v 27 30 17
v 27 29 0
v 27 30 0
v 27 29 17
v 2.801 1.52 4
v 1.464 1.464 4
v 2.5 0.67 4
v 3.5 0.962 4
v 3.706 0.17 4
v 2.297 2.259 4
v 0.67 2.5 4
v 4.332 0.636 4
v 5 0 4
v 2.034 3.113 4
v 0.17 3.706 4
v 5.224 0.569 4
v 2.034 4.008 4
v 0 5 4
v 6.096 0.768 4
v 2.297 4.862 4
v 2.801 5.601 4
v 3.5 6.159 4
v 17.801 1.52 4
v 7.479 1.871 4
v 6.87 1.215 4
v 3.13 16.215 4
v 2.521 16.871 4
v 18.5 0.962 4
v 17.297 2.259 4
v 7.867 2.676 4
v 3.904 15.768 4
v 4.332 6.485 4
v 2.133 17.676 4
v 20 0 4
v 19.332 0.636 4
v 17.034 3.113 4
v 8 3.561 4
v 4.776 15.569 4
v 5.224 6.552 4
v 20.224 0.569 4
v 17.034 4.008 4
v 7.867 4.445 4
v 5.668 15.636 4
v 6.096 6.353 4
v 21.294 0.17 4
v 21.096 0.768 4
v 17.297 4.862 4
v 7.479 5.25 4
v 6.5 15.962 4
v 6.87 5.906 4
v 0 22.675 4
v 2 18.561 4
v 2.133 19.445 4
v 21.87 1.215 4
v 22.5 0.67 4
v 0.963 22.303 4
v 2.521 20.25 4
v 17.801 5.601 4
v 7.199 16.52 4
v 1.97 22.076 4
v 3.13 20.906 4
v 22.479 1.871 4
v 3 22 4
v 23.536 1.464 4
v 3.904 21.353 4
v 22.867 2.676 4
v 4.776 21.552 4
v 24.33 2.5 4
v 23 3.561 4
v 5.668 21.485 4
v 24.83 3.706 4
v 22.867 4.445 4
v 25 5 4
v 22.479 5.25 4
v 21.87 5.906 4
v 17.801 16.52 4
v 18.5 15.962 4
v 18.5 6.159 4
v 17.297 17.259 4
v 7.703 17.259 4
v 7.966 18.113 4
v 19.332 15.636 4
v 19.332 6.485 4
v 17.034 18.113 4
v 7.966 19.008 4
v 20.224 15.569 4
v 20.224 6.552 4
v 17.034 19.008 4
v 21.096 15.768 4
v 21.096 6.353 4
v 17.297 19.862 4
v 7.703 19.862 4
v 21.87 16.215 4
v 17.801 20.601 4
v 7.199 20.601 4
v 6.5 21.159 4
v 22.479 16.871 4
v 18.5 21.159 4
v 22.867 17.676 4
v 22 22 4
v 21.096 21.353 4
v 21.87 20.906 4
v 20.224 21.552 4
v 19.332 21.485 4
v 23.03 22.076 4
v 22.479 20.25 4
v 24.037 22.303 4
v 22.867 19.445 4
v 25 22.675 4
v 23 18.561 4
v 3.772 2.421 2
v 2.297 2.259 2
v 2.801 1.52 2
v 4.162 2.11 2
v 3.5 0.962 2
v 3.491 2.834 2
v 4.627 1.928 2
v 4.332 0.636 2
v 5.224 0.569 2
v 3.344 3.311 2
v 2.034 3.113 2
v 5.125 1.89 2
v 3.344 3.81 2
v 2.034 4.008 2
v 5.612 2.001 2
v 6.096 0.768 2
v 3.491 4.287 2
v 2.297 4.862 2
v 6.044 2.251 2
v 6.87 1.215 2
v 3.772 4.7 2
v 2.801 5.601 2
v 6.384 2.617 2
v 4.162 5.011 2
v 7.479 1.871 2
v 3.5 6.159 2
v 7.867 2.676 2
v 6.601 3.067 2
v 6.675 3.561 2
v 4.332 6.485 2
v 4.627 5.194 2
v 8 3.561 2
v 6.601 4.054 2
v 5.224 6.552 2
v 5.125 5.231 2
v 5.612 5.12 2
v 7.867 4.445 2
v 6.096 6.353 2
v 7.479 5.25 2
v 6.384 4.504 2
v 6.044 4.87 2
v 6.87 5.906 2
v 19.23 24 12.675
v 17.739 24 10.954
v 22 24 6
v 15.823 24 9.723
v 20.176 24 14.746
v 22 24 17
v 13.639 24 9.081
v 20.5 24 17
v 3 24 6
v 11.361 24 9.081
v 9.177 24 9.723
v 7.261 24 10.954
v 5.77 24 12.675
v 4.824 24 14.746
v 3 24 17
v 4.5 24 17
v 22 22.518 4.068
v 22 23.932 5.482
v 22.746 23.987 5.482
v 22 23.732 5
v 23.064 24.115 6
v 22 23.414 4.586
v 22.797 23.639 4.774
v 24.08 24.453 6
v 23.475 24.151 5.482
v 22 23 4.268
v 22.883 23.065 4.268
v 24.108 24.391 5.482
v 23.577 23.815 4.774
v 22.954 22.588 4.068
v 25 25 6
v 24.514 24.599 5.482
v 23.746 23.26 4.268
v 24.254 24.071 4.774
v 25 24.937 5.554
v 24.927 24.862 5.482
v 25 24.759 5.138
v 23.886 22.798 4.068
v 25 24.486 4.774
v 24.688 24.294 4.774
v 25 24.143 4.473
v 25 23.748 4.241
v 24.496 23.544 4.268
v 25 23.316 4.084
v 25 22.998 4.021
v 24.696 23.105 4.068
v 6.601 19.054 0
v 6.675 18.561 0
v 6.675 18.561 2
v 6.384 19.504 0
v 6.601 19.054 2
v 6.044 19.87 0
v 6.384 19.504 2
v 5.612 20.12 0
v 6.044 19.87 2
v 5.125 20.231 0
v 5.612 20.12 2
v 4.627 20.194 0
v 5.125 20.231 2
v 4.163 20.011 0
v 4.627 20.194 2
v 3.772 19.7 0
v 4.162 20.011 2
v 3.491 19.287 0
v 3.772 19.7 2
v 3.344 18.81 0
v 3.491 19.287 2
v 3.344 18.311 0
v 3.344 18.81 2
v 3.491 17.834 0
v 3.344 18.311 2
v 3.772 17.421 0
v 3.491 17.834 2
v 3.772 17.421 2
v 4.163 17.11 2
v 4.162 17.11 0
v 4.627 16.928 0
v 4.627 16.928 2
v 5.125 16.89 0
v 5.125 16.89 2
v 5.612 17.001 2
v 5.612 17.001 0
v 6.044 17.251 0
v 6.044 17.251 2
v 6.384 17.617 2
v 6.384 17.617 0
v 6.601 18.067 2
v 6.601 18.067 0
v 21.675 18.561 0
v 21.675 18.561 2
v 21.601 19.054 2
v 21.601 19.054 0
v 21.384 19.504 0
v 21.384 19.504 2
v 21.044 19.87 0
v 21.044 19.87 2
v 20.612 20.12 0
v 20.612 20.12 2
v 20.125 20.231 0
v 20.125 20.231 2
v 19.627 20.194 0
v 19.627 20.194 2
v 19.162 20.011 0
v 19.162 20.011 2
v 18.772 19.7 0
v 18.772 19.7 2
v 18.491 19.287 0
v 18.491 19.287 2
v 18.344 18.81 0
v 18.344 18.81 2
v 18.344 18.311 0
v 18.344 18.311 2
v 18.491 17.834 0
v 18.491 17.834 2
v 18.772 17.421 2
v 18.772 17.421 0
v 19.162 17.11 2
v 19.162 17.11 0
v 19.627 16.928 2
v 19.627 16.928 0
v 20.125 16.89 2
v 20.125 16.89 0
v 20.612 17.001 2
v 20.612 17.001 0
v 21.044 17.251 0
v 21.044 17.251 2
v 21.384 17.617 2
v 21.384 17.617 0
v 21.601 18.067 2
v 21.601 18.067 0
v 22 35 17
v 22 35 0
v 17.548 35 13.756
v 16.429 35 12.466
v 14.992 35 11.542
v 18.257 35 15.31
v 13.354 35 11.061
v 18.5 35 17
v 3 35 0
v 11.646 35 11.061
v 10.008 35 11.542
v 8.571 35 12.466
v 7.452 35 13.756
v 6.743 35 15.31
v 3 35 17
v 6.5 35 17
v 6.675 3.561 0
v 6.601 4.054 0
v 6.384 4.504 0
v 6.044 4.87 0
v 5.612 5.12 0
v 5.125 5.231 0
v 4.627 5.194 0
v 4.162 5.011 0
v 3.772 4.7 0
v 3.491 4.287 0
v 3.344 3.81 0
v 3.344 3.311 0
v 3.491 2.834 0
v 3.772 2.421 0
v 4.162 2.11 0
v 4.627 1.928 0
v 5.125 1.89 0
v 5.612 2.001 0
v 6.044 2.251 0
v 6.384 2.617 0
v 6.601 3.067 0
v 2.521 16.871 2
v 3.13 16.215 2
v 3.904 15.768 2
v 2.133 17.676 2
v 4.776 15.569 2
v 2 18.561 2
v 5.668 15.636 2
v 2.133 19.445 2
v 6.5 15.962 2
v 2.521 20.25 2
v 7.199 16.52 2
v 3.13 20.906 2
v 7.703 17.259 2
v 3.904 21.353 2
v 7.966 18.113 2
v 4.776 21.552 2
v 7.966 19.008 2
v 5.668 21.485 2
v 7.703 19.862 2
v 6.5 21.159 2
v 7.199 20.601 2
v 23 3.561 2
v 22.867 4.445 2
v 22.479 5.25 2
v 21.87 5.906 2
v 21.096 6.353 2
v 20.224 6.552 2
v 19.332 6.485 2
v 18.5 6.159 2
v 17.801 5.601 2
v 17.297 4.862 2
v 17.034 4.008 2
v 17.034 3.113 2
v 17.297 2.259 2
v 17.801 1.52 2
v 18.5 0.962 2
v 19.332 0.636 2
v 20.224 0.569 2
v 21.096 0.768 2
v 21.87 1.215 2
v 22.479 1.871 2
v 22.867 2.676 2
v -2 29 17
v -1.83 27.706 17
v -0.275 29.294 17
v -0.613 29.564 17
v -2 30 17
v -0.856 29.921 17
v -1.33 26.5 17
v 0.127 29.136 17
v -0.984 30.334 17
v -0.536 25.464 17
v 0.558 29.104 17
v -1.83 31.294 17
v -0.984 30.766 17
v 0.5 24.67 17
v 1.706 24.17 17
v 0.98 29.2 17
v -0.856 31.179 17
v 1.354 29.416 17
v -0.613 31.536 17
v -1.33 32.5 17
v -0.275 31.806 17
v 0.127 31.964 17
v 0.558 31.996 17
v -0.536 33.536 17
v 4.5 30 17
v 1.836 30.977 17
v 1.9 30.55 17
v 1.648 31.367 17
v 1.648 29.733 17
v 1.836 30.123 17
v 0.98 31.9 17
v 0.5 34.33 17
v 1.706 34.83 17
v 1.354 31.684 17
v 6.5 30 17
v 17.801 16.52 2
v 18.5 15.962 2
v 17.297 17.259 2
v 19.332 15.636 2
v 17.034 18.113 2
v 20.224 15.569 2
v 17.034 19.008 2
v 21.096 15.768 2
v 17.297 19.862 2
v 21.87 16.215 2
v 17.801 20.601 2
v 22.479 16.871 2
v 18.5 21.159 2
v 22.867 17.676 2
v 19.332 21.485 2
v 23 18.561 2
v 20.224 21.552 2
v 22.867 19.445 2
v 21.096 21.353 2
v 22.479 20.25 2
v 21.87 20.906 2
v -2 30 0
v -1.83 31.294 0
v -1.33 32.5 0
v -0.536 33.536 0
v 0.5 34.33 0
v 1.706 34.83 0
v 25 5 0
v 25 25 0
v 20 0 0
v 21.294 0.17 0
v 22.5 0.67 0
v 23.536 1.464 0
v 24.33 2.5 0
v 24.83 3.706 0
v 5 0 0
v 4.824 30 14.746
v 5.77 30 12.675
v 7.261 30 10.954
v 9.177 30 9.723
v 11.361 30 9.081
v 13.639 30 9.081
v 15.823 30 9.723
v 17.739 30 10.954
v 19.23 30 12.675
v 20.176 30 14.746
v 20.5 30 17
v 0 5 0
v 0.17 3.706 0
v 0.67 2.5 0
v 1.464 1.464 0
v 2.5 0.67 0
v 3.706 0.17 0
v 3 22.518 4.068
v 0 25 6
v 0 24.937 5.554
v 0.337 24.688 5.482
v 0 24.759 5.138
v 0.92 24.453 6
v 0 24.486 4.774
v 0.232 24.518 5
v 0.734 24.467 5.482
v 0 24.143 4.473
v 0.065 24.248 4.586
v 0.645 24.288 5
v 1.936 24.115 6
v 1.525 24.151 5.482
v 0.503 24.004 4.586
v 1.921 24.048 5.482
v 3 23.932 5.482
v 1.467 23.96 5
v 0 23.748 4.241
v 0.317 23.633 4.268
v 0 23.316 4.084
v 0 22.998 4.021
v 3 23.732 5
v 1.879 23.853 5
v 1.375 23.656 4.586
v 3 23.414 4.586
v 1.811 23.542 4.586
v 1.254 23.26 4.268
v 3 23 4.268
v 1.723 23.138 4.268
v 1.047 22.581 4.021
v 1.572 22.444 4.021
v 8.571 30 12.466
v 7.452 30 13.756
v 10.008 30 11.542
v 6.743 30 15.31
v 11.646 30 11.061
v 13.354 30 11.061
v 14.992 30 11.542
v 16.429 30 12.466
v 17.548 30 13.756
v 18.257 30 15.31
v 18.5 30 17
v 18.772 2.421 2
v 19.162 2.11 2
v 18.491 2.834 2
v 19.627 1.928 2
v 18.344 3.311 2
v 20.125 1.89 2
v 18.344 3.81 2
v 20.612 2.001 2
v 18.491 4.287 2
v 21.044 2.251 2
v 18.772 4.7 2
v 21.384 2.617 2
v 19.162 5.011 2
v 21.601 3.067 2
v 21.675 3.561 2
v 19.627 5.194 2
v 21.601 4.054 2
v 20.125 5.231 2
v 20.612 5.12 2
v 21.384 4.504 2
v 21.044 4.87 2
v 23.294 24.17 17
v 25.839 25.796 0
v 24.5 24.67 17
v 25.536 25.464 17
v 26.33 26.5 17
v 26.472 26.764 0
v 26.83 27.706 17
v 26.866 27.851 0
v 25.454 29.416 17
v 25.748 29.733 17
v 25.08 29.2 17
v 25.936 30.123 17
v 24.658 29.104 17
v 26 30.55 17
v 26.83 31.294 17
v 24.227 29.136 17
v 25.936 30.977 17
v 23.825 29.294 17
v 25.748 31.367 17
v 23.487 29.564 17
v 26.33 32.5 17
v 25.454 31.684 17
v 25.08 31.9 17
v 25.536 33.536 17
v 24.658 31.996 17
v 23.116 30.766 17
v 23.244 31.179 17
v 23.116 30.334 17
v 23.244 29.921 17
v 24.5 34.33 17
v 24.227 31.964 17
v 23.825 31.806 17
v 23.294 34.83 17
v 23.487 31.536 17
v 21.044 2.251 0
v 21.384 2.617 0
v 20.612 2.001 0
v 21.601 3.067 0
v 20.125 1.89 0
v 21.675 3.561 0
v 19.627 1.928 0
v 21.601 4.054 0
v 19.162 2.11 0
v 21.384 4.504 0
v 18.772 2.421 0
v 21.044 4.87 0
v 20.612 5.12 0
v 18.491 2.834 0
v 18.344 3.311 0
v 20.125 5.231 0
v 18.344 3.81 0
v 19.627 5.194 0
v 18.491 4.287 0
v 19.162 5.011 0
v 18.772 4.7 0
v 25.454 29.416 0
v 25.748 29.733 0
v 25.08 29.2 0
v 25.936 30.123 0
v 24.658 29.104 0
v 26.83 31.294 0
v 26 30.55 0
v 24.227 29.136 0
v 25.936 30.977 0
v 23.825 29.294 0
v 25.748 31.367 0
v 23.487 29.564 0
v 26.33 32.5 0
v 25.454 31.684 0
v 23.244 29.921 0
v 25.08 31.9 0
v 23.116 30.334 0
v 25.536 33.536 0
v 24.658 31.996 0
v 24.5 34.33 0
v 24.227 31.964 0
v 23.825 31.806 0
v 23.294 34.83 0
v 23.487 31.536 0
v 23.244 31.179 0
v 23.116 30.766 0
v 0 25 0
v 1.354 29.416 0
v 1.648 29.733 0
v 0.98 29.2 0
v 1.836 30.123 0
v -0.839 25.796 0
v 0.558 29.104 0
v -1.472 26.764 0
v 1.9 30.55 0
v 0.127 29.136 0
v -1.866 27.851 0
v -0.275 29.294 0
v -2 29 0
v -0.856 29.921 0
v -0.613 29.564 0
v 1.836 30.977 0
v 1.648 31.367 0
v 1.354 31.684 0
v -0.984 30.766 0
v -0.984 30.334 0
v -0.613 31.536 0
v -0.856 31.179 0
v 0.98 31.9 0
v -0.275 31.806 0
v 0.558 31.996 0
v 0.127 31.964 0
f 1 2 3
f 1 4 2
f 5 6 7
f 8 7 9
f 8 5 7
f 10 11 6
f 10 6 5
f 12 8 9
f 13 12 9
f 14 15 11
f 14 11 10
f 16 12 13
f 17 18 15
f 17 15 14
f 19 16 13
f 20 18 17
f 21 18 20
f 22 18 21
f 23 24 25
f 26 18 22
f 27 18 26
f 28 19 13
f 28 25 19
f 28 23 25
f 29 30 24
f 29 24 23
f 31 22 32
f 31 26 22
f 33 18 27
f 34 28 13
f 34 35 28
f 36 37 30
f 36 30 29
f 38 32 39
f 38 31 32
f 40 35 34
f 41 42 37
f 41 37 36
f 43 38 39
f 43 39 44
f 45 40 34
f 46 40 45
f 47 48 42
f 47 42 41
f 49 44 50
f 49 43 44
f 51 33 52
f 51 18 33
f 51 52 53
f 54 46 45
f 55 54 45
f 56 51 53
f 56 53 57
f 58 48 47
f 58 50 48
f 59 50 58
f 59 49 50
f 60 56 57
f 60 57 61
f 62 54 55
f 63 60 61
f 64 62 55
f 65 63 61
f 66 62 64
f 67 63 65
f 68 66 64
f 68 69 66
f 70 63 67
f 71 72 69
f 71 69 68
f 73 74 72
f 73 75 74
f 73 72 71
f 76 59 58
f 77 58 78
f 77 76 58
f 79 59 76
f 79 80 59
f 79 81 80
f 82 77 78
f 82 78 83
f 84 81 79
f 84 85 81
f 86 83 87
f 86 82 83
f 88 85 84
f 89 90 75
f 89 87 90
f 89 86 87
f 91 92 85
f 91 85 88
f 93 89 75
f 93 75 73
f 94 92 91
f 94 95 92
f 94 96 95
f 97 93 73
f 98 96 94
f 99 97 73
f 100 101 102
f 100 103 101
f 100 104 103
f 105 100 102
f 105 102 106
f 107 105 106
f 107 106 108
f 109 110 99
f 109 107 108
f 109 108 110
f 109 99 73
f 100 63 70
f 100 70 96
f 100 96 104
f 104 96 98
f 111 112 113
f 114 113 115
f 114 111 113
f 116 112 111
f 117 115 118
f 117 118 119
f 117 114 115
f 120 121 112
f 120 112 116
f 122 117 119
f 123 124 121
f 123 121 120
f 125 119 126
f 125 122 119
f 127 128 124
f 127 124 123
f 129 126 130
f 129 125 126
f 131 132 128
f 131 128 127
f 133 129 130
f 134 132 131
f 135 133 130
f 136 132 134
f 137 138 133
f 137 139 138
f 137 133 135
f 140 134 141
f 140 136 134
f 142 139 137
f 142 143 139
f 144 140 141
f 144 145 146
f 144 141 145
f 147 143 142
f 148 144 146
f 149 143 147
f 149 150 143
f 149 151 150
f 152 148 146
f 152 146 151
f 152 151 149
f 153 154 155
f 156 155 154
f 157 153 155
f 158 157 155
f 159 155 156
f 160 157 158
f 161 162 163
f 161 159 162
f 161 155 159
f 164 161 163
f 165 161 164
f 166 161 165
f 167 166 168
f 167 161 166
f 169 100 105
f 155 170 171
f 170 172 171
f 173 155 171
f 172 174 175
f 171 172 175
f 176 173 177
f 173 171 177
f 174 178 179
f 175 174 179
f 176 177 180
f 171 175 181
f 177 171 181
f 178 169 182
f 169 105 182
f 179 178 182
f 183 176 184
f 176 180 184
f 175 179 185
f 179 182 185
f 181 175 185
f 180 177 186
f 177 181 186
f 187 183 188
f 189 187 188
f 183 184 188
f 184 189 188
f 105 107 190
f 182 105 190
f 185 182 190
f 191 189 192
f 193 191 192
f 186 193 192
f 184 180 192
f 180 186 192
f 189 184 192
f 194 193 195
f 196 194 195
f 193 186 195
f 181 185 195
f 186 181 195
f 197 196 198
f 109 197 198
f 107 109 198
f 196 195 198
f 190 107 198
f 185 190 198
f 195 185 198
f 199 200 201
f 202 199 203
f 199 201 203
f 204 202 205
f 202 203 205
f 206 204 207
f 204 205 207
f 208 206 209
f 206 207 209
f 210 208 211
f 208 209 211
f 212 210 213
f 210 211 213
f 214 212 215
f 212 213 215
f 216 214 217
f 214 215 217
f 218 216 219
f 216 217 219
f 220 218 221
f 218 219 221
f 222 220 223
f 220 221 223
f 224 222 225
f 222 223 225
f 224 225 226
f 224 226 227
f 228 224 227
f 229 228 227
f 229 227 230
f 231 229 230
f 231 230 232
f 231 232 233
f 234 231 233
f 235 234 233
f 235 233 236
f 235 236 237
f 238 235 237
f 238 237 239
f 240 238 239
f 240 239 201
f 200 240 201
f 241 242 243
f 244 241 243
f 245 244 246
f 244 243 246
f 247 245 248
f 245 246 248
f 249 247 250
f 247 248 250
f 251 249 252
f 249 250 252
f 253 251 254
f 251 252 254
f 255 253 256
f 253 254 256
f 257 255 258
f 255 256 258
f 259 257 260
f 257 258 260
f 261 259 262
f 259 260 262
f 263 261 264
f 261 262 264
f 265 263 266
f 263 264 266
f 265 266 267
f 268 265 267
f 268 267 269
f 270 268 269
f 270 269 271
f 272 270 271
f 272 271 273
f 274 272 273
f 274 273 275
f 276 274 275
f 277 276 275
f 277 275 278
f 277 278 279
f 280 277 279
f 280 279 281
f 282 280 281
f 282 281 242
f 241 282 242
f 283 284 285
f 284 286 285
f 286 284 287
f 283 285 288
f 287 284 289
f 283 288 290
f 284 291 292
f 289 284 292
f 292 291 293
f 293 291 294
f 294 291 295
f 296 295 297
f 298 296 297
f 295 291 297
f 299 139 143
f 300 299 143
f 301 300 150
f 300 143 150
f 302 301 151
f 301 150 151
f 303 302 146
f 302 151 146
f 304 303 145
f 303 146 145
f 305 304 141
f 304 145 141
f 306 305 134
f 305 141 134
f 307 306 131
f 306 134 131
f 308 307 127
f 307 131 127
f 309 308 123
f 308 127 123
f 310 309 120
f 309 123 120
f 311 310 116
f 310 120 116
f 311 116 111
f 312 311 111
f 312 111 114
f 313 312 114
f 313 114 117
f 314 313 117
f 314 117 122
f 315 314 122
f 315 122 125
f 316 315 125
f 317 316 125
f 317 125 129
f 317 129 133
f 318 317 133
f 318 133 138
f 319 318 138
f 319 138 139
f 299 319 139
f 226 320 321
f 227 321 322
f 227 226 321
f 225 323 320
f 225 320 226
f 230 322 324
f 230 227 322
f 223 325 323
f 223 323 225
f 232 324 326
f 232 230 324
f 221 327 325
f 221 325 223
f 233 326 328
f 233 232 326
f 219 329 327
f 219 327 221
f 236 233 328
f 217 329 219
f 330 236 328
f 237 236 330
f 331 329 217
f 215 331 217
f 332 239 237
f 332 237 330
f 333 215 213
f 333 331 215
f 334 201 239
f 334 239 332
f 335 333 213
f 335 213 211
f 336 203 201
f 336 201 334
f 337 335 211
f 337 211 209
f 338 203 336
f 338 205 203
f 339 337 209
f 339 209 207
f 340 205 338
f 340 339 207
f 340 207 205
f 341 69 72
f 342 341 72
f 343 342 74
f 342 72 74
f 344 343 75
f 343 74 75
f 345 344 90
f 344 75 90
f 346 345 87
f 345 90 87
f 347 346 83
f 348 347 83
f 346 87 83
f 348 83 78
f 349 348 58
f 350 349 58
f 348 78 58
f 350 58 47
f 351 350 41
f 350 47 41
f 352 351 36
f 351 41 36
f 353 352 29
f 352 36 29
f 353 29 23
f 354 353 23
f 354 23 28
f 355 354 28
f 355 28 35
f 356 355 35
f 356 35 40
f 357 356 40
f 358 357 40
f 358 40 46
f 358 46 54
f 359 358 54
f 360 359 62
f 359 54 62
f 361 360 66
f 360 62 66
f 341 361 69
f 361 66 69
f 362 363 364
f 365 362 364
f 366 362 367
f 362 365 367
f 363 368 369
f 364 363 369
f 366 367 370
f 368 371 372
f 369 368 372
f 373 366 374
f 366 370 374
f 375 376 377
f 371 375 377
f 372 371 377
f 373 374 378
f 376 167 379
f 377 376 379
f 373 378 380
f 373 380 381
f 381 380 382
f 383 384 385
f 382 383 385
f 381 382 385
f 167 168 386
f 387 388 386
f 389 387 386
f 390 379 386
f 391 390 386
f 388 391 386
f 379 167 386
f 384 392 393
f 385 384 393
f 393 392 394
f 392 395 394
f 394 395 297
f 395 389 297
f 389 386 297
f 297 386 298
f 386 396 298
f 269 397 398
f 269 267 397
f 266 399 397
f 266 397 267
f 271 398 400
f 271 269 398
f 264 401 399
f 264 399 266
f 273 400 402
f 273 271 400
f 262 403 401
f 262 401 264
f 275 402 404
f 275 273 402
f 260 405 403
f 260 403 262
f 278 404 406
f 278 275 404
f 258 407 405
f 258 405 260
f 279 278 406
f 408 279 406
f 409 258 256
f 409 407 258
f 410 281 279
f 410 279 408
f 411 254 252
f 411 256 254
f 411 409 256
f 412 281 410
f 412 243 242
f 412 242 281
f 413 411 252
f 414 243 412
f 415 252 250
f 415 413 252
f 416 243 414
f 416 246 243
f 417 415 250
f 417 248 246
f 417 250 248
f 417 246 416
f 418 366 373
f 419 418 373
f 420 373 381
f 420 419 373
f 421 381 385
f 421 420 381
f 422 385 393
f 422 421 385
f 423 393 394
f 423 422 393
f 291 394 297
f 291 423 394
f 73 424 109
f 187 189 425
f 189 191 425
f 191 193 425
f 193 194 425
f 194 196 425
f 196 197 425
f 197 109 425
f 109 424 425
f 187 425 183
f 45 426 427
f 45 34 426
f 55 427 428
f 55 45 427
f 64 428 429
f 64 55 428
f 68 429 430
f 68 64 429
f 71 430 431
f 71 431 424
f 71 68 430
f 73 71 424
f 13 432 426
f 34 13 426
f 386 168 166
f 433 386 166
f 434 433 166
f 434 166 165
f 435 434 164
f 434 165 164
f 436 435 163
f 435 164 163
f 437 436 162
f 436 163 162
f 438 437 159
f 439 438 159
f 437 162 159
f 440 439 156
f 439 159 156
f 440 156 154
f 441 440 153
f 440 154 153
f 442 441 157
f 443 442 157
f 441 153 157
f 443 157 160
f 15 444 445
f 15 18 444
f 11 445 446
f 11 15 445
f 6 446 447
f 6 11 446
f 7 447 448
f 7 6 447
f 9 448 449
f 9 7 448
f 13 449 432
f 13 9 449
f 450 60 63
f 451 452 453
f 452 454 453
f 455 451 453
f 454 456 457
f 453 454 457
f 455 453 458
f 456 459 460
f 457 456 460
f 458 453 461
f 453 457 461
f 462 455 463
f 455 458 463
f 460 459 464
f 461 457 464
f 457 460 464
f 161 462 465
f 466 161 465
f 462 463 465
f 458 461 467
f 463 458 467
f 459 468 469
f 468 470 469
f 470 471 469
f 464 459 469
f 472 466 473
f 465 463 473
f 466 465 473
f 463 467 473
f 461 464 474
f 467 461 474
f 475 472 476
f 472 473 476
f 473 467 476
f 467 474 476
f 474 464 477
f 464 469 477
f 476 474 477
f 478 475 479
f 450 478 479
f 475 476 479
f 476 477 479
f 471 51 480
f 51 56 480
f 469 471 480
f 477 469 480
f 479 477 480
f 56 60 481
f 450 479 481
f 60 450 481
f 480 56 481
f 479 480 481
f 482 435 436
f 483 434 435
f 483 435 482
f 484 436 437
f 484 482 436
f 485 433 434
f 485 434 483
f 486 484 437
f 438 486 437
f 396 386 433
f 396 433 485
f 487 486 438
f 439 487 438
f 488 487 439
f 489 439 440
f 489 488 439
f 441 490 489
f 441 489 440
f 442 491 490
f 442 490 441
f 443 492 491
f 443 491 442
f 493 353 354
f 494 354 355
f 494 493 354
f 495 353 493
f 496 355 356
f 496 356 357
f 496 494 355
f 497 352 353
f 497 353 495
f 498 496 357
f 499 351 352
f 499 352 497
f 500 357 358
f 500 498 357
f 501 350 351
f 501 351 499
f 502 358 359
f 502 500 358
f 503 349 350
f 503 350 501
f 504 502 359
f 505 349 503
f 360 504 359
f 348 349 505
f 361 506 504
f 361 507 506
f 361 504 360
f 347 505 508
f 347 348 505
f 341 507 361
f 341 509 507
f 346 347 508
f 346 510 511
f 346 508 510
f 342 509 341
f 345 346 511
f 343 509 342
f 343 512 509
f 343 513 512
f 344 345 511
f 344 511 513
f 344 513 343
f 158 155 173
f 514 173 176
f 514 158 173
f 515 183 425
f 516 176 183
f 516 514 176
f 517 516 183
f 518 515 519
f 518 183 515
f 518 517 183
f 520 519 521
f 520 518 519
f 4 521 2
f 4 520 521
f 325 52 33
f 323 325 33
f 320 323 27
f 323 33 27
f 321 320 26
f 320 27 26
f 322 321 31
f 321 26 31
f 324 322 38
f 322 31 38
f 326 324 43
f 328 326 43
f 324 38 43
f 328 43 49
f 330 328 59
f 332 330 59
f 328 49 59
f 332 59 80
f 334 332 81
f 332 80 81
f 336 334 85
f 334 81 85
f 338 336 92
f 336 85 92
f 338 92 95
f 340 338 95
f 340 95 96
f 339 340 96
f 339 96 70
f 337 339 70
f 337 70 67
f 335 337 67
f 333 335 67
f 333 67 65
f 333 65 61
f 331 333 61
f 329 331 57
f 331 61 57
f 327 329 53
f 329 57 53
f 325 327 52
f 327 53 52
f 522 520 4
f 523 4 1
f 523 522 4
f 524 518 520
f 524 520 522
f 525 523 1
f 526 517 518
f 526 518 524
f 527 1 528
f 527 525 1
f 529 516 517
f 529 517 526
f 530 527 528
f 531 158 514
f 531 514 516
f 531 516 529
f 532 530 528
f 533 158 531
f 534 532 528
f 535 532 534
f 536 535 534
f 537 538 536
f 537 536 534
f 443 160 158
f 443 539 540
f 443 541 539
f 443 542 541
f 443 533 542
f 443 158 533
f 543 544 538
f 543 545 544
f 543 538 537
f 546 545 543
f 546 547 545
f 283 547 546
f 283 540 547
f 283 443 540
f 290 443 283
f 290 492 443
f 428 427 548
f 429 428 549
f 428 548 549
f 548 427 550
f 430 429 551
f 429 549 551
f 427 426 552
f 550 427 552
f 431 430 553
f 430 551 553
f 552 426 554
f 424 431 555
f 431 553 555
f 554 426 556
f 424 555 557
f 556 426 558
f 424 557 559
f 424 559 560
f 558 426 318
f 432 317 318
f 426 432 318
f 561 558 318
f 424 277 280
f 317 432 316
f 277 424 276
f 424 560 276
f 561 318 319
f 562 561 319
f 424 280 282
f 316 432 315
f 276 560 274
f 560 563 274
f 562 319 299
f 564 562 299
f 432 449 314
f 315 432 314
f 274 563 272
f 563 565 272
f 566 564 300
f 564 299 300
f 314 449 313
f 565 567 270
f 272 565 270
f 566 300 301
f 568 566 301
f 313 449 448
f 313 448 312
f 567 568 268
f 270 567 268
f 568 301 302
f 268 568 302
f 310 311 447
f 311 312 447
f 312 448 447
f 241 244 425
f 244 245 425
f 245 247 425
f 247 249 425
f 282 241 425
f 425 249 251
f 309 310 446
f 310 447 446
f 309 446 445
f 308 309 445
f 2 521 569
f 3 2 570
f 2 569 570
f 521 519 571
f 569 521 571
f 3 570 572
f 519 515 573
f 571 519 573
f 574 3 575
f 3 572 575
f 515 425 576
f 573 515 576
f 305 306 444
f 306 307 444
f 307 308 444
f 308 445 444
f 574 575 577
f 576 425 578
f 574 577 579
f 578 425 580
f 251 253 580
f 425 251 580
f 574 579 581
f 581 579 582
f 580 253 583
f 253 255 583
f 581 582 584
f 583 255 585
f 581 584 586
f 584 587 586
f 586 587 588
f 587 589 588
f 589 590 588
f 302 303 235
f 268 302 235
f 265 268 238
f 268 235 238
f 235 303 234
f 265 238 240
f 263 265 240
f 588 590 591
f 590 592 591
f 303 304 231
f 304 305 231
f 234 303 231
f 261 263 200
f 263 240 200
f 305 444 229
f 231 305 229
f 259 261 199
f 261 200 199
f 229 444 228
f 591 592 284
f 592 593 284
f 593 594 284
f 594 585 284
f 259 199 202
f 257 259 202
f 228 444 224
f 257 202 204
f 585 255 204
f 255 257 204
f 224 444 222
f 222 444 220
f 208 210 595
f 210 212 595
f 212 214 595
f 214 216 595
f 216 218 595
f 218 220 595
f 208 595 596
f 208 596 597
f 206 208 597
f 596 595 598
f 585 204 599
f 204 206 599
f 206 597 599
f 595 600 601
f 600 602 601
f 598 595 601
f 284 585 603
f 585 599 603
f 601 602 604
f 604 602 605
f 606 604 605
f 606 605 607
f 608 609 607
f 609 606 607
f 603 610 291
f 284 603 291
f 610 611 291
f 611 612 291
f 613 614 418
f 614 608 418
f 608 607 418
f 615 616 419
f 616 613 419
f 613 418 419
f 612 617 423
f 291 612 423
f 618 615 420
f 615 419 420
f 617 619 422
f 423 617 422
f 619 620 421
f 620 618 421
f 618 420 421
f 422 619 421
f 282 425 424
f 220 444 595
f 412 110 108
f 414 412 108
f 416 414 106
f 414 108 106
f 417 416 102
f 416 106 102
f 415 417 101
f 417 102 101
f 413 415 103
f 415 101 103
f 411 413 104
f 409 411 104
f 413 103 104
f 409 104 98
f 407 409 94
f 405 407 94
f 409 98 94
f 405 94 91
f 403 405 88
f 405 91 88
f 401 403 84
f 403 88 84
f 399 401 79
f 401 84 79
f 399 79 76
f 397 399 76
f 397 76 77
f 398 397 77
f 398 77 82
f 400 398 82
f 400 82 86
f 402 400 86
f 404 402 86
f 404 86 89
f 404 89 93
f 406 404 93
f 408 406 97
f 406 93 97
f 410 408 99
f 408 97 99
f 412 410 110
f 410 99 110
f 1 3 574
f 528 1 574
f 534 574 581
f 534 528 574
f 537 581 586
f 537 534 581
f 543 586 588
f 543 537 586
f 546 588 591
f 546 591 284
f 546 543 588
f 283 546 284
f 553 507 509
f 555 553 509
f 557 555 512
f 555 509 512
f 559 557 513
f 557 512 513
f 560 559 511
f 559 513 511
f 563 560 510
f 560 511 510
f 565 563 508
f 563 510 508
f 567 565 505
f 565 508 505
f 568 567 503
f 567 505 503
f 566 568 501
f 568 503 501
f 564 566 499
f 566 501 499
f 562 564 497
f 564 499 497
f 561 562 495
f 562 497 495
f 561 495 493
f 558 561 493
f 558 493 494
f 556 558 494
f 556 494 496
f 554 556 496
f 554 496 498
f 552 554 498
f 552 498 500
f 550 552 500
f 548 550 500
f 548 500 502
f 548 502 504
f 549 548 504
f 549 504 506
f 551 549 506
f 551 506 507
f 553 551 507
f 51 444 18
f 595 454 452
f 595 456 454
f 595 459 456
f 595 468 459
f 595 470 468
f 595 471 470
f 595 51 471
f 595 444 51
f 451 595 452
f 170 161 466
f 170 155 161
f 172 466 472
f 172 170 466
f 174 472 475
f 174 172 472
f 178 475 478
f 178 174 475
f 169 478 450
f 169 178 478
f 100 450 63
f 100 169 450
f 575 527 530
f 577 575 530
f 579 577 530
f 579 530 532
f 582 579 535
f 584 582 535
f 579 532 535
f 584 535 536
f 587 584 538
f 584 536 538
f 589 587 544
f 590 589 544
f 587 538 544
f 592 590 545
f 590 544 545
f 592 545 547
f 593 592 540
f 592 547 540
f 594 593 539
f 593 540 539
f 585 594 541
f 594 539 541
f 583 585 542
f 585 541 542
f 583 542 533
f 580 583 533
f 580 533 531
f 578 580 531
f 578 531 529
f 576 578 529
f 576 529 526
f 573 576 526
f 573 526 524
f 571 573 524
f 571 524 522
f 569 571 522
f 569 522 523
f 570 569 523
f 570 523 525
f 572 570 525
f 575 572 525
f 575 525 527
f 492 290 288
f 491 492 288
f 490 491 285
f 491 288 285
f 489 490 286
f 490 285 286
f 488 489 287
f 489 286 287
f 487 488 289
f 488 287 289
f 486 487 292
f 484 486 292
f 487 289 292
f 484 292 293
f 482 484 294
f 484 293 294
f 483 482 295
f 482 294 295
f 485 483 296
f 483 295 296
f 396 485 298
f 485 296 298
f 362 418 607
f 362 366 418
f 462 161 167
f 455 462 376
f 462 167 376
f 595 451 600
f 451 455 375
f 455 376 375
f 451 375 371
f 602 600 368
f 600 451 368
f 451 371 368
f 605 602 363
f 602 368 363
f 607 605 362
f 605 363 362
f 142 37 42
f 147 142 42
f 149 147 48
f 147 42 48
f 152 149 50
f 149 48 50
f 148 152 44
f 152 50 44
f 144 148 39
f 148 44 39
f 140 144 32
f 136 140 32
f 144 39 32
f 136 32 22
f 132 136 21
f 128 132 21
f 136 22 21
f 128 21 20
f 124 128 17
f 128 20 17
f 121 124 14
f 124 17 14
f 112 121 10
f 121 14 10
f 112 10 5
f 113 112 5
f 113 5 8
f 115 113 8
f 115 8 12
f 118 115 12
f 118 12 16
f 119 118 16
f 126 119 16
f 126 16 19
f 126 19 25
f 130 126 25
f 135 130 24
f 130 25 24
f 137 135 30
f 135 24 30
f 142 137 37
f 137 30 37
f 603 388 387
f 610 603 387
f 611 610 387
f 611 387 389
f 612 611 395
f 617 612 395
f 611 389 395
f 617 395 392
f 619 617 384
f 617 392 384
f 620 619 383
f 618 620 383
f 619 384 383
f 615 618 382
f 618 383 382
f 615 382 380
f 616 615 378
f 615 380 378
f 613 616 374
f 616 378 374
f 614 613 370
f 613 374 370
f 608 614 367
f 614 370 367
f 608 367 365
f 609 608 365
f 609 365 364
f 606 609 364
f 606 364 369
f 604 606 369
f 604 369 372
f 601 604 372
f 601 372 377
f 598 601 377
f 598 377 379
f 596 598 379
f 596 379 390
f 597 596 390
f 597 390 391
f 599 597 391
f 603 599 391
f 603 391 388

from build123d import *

# Parameters (mm, degrees)
F0_W      = 25
F0_H      = 35
F1_DEPTH  = 4
F2_R      = 1.675
F3_DEPTH  = 25
F4_W      = 25
F4_H      = 11
F5_DEPTH  = 13
F7_DEPTH  = 6
F8_R      = 8
F9_DEPTH  = 6
F2_R_2    = 3
F10_DEPTH = 2
F11_R     = 5
F13_DEPTH = 2
F14_W     = 11
F14_H     = 17
F15_DEPTH = 2
F16_R     = 1.45
F17_DEPTH = 25
F18_R     = 5
F19_R     = 2


with BuildPart() as f1:
    # F0 (on Top) → F1 (new body)
    with BuildSketch(Plane.XY):
        with Locations((12.5, 17.5)):
            Rectangle(F0_W, F0_H)
    extrude(amount=F1_DEPTH)

    # F2 (on face) → F3 (cut)
    with BuildSketch(Plane.XY.offset(4)):
        with BuildLine():
            ThreePointArc((3.325, 18.5605346784), (5, 16.8855346784), (6.675, 18.5605346784))
            ThreePointArc((6.675, 18.5605346784), (5, 20.2355346784), (3.325, 18.5605346784))
        make_face()
        with Locations((20, 18.5605346784)):
            Circle(F2_R)
        with Locations((20, 3.5605346784)):
            Circle(F2_R)
        with Locations((5, 3.5605346784)):
            Circle(F2_R)
    extrude(amount=-F3_DEPTH, mode=Mode.SUBTRACT)

    # F4 (on face) → F5 (join)
    with BuildSketch(Plane.XY.offset(4)):
        with Locations((12.5, 29.5)):
            Rectangle(F4_W, F4_H)
    extrude(amount=F5_DEPTH)

    # F6 (on face) → F7 (cut)
    with BuildSketch(Plane(origin=(0, 35, 0), x_dir=(-1, 0, 0), z_dir=(0, 1, 0))):
        with BuildLine():
            ThreePointArc((-18.5, 17), (-12.5, 11), (-6.5, 17))
            Line((-6.5, 17), (-18.5, 17))
        make_face()
    extrude(amount=-F7_DEPTH, mode=Mode.SUBTRACT)

    # F8 (on face) → F9 (cut)
    with BuildSketch(Plane.XZ.offset(-24)):
        with Locations((12.5, 17)):
            Circle(F8_R)
    extrude(amount=-F9_DEPTH, mode=Mode.SUBTRACT)

    # F2 (on face) → F10 (cut)
    with BuildSketch(Plane.XY.offset(4)):
        with BuildLine():
            ThreePointArc((8, 18.5605346784), (5, 21.5605346784), (2, 18.5605346784))
            ThreePointArc((2, 18.5605346784), (5, 15.5605346784), (8, 18.5605346784))
        make_face()
        with BuildLine():
            ThreePointArc((3.325, 18.5605346784), (5, 20.2355346784), (6.675, 18.5605346784))
            ThreePointArc((6.675, 18.5605346784), (5, 16.8855346784), (3.325, 18.5605346784))
        make_face(mode=Mode.SUBTRACT)
        with Locations((20, 18.5605346784)):
            Circle(F2_R_2)
        with Locations((20, 18.5605346784)):
            Circle(F2_R, mode=Mode.SUBTRACT)
        with Locations((20, 3.5605346784)):
            Circle(F2_R_2)
        with Locations((20, 3.5605346784)):
            Circle(F2_R, mode=Mode.SUBTRACT)
        with Locations((5, 3.5605346784)):
            Circle(F2_R_2)
        with Locations((5, 3.5605346784)):
            Circle(F2_R, mode=Mode.SUBTRACT)
    extrude(amount=-F10_DEPTH, mode=Mode.SUBTRACT)

    # F11
    f11_edges = [f1.edges().sort_by_distance(p)[0] for p in [
        (0, 0, 2),
        (25, 0, 2),
    ]]
    fillet(f11_edges, radius=F11_R)

    # F12 (on face) → F13 (join)
    with BuildSketch(Plane(origin=(0, 0, 0), x_dir=(0, -1, 0), z_dir=(-1, 0, 0))):
        Polygon((-35, 17), (-35, 0), (-24, 0), (-24, 4), (-24, 17), align=None)
    extrude(amount=F13_DEPTH)

    # F14 (on face) → F15 (join)
    with BuildSketch(Plane.YZ.offset(25)):
        with Locations((29.5, 8.5)):
            Rectangle(F14_W, F14_H)
    extrude(amount=F15_DEPTH)

    # F16 (on face) → F17 (cut)
    with BuildSketch(Plane.XY.offset(17)):
        with Locations((0.45, 30.55)):
            Circle(F16_R)
        with Locations((24.55, 30.55)):
            Circle(F16_R)
    extrude(amount=-F17_DEPTH, mode=Mode.SUBTRACT)

    # F18
    f18_edges = [f1.edges().sort_by_distance(p)[0] for p in [
        (-2, 24, 8.5),
        (-2, 35, 8.5),
        (27, 35, 8.5),
        (27, 24, 8.5),
    ]]
    fillet(f18_edges, radius=F18_R)

    # F19
    f19_edges = [f1.edges().sort_by_distance(p)[0] for p in [
        (12.5, 24, 4),
        (23.581139, 24.256584, 4),
        (1.418861, 24.256584, 4),
    ]]
    fillet(f19_edges, radius=F19_R)


solid = f1.part
